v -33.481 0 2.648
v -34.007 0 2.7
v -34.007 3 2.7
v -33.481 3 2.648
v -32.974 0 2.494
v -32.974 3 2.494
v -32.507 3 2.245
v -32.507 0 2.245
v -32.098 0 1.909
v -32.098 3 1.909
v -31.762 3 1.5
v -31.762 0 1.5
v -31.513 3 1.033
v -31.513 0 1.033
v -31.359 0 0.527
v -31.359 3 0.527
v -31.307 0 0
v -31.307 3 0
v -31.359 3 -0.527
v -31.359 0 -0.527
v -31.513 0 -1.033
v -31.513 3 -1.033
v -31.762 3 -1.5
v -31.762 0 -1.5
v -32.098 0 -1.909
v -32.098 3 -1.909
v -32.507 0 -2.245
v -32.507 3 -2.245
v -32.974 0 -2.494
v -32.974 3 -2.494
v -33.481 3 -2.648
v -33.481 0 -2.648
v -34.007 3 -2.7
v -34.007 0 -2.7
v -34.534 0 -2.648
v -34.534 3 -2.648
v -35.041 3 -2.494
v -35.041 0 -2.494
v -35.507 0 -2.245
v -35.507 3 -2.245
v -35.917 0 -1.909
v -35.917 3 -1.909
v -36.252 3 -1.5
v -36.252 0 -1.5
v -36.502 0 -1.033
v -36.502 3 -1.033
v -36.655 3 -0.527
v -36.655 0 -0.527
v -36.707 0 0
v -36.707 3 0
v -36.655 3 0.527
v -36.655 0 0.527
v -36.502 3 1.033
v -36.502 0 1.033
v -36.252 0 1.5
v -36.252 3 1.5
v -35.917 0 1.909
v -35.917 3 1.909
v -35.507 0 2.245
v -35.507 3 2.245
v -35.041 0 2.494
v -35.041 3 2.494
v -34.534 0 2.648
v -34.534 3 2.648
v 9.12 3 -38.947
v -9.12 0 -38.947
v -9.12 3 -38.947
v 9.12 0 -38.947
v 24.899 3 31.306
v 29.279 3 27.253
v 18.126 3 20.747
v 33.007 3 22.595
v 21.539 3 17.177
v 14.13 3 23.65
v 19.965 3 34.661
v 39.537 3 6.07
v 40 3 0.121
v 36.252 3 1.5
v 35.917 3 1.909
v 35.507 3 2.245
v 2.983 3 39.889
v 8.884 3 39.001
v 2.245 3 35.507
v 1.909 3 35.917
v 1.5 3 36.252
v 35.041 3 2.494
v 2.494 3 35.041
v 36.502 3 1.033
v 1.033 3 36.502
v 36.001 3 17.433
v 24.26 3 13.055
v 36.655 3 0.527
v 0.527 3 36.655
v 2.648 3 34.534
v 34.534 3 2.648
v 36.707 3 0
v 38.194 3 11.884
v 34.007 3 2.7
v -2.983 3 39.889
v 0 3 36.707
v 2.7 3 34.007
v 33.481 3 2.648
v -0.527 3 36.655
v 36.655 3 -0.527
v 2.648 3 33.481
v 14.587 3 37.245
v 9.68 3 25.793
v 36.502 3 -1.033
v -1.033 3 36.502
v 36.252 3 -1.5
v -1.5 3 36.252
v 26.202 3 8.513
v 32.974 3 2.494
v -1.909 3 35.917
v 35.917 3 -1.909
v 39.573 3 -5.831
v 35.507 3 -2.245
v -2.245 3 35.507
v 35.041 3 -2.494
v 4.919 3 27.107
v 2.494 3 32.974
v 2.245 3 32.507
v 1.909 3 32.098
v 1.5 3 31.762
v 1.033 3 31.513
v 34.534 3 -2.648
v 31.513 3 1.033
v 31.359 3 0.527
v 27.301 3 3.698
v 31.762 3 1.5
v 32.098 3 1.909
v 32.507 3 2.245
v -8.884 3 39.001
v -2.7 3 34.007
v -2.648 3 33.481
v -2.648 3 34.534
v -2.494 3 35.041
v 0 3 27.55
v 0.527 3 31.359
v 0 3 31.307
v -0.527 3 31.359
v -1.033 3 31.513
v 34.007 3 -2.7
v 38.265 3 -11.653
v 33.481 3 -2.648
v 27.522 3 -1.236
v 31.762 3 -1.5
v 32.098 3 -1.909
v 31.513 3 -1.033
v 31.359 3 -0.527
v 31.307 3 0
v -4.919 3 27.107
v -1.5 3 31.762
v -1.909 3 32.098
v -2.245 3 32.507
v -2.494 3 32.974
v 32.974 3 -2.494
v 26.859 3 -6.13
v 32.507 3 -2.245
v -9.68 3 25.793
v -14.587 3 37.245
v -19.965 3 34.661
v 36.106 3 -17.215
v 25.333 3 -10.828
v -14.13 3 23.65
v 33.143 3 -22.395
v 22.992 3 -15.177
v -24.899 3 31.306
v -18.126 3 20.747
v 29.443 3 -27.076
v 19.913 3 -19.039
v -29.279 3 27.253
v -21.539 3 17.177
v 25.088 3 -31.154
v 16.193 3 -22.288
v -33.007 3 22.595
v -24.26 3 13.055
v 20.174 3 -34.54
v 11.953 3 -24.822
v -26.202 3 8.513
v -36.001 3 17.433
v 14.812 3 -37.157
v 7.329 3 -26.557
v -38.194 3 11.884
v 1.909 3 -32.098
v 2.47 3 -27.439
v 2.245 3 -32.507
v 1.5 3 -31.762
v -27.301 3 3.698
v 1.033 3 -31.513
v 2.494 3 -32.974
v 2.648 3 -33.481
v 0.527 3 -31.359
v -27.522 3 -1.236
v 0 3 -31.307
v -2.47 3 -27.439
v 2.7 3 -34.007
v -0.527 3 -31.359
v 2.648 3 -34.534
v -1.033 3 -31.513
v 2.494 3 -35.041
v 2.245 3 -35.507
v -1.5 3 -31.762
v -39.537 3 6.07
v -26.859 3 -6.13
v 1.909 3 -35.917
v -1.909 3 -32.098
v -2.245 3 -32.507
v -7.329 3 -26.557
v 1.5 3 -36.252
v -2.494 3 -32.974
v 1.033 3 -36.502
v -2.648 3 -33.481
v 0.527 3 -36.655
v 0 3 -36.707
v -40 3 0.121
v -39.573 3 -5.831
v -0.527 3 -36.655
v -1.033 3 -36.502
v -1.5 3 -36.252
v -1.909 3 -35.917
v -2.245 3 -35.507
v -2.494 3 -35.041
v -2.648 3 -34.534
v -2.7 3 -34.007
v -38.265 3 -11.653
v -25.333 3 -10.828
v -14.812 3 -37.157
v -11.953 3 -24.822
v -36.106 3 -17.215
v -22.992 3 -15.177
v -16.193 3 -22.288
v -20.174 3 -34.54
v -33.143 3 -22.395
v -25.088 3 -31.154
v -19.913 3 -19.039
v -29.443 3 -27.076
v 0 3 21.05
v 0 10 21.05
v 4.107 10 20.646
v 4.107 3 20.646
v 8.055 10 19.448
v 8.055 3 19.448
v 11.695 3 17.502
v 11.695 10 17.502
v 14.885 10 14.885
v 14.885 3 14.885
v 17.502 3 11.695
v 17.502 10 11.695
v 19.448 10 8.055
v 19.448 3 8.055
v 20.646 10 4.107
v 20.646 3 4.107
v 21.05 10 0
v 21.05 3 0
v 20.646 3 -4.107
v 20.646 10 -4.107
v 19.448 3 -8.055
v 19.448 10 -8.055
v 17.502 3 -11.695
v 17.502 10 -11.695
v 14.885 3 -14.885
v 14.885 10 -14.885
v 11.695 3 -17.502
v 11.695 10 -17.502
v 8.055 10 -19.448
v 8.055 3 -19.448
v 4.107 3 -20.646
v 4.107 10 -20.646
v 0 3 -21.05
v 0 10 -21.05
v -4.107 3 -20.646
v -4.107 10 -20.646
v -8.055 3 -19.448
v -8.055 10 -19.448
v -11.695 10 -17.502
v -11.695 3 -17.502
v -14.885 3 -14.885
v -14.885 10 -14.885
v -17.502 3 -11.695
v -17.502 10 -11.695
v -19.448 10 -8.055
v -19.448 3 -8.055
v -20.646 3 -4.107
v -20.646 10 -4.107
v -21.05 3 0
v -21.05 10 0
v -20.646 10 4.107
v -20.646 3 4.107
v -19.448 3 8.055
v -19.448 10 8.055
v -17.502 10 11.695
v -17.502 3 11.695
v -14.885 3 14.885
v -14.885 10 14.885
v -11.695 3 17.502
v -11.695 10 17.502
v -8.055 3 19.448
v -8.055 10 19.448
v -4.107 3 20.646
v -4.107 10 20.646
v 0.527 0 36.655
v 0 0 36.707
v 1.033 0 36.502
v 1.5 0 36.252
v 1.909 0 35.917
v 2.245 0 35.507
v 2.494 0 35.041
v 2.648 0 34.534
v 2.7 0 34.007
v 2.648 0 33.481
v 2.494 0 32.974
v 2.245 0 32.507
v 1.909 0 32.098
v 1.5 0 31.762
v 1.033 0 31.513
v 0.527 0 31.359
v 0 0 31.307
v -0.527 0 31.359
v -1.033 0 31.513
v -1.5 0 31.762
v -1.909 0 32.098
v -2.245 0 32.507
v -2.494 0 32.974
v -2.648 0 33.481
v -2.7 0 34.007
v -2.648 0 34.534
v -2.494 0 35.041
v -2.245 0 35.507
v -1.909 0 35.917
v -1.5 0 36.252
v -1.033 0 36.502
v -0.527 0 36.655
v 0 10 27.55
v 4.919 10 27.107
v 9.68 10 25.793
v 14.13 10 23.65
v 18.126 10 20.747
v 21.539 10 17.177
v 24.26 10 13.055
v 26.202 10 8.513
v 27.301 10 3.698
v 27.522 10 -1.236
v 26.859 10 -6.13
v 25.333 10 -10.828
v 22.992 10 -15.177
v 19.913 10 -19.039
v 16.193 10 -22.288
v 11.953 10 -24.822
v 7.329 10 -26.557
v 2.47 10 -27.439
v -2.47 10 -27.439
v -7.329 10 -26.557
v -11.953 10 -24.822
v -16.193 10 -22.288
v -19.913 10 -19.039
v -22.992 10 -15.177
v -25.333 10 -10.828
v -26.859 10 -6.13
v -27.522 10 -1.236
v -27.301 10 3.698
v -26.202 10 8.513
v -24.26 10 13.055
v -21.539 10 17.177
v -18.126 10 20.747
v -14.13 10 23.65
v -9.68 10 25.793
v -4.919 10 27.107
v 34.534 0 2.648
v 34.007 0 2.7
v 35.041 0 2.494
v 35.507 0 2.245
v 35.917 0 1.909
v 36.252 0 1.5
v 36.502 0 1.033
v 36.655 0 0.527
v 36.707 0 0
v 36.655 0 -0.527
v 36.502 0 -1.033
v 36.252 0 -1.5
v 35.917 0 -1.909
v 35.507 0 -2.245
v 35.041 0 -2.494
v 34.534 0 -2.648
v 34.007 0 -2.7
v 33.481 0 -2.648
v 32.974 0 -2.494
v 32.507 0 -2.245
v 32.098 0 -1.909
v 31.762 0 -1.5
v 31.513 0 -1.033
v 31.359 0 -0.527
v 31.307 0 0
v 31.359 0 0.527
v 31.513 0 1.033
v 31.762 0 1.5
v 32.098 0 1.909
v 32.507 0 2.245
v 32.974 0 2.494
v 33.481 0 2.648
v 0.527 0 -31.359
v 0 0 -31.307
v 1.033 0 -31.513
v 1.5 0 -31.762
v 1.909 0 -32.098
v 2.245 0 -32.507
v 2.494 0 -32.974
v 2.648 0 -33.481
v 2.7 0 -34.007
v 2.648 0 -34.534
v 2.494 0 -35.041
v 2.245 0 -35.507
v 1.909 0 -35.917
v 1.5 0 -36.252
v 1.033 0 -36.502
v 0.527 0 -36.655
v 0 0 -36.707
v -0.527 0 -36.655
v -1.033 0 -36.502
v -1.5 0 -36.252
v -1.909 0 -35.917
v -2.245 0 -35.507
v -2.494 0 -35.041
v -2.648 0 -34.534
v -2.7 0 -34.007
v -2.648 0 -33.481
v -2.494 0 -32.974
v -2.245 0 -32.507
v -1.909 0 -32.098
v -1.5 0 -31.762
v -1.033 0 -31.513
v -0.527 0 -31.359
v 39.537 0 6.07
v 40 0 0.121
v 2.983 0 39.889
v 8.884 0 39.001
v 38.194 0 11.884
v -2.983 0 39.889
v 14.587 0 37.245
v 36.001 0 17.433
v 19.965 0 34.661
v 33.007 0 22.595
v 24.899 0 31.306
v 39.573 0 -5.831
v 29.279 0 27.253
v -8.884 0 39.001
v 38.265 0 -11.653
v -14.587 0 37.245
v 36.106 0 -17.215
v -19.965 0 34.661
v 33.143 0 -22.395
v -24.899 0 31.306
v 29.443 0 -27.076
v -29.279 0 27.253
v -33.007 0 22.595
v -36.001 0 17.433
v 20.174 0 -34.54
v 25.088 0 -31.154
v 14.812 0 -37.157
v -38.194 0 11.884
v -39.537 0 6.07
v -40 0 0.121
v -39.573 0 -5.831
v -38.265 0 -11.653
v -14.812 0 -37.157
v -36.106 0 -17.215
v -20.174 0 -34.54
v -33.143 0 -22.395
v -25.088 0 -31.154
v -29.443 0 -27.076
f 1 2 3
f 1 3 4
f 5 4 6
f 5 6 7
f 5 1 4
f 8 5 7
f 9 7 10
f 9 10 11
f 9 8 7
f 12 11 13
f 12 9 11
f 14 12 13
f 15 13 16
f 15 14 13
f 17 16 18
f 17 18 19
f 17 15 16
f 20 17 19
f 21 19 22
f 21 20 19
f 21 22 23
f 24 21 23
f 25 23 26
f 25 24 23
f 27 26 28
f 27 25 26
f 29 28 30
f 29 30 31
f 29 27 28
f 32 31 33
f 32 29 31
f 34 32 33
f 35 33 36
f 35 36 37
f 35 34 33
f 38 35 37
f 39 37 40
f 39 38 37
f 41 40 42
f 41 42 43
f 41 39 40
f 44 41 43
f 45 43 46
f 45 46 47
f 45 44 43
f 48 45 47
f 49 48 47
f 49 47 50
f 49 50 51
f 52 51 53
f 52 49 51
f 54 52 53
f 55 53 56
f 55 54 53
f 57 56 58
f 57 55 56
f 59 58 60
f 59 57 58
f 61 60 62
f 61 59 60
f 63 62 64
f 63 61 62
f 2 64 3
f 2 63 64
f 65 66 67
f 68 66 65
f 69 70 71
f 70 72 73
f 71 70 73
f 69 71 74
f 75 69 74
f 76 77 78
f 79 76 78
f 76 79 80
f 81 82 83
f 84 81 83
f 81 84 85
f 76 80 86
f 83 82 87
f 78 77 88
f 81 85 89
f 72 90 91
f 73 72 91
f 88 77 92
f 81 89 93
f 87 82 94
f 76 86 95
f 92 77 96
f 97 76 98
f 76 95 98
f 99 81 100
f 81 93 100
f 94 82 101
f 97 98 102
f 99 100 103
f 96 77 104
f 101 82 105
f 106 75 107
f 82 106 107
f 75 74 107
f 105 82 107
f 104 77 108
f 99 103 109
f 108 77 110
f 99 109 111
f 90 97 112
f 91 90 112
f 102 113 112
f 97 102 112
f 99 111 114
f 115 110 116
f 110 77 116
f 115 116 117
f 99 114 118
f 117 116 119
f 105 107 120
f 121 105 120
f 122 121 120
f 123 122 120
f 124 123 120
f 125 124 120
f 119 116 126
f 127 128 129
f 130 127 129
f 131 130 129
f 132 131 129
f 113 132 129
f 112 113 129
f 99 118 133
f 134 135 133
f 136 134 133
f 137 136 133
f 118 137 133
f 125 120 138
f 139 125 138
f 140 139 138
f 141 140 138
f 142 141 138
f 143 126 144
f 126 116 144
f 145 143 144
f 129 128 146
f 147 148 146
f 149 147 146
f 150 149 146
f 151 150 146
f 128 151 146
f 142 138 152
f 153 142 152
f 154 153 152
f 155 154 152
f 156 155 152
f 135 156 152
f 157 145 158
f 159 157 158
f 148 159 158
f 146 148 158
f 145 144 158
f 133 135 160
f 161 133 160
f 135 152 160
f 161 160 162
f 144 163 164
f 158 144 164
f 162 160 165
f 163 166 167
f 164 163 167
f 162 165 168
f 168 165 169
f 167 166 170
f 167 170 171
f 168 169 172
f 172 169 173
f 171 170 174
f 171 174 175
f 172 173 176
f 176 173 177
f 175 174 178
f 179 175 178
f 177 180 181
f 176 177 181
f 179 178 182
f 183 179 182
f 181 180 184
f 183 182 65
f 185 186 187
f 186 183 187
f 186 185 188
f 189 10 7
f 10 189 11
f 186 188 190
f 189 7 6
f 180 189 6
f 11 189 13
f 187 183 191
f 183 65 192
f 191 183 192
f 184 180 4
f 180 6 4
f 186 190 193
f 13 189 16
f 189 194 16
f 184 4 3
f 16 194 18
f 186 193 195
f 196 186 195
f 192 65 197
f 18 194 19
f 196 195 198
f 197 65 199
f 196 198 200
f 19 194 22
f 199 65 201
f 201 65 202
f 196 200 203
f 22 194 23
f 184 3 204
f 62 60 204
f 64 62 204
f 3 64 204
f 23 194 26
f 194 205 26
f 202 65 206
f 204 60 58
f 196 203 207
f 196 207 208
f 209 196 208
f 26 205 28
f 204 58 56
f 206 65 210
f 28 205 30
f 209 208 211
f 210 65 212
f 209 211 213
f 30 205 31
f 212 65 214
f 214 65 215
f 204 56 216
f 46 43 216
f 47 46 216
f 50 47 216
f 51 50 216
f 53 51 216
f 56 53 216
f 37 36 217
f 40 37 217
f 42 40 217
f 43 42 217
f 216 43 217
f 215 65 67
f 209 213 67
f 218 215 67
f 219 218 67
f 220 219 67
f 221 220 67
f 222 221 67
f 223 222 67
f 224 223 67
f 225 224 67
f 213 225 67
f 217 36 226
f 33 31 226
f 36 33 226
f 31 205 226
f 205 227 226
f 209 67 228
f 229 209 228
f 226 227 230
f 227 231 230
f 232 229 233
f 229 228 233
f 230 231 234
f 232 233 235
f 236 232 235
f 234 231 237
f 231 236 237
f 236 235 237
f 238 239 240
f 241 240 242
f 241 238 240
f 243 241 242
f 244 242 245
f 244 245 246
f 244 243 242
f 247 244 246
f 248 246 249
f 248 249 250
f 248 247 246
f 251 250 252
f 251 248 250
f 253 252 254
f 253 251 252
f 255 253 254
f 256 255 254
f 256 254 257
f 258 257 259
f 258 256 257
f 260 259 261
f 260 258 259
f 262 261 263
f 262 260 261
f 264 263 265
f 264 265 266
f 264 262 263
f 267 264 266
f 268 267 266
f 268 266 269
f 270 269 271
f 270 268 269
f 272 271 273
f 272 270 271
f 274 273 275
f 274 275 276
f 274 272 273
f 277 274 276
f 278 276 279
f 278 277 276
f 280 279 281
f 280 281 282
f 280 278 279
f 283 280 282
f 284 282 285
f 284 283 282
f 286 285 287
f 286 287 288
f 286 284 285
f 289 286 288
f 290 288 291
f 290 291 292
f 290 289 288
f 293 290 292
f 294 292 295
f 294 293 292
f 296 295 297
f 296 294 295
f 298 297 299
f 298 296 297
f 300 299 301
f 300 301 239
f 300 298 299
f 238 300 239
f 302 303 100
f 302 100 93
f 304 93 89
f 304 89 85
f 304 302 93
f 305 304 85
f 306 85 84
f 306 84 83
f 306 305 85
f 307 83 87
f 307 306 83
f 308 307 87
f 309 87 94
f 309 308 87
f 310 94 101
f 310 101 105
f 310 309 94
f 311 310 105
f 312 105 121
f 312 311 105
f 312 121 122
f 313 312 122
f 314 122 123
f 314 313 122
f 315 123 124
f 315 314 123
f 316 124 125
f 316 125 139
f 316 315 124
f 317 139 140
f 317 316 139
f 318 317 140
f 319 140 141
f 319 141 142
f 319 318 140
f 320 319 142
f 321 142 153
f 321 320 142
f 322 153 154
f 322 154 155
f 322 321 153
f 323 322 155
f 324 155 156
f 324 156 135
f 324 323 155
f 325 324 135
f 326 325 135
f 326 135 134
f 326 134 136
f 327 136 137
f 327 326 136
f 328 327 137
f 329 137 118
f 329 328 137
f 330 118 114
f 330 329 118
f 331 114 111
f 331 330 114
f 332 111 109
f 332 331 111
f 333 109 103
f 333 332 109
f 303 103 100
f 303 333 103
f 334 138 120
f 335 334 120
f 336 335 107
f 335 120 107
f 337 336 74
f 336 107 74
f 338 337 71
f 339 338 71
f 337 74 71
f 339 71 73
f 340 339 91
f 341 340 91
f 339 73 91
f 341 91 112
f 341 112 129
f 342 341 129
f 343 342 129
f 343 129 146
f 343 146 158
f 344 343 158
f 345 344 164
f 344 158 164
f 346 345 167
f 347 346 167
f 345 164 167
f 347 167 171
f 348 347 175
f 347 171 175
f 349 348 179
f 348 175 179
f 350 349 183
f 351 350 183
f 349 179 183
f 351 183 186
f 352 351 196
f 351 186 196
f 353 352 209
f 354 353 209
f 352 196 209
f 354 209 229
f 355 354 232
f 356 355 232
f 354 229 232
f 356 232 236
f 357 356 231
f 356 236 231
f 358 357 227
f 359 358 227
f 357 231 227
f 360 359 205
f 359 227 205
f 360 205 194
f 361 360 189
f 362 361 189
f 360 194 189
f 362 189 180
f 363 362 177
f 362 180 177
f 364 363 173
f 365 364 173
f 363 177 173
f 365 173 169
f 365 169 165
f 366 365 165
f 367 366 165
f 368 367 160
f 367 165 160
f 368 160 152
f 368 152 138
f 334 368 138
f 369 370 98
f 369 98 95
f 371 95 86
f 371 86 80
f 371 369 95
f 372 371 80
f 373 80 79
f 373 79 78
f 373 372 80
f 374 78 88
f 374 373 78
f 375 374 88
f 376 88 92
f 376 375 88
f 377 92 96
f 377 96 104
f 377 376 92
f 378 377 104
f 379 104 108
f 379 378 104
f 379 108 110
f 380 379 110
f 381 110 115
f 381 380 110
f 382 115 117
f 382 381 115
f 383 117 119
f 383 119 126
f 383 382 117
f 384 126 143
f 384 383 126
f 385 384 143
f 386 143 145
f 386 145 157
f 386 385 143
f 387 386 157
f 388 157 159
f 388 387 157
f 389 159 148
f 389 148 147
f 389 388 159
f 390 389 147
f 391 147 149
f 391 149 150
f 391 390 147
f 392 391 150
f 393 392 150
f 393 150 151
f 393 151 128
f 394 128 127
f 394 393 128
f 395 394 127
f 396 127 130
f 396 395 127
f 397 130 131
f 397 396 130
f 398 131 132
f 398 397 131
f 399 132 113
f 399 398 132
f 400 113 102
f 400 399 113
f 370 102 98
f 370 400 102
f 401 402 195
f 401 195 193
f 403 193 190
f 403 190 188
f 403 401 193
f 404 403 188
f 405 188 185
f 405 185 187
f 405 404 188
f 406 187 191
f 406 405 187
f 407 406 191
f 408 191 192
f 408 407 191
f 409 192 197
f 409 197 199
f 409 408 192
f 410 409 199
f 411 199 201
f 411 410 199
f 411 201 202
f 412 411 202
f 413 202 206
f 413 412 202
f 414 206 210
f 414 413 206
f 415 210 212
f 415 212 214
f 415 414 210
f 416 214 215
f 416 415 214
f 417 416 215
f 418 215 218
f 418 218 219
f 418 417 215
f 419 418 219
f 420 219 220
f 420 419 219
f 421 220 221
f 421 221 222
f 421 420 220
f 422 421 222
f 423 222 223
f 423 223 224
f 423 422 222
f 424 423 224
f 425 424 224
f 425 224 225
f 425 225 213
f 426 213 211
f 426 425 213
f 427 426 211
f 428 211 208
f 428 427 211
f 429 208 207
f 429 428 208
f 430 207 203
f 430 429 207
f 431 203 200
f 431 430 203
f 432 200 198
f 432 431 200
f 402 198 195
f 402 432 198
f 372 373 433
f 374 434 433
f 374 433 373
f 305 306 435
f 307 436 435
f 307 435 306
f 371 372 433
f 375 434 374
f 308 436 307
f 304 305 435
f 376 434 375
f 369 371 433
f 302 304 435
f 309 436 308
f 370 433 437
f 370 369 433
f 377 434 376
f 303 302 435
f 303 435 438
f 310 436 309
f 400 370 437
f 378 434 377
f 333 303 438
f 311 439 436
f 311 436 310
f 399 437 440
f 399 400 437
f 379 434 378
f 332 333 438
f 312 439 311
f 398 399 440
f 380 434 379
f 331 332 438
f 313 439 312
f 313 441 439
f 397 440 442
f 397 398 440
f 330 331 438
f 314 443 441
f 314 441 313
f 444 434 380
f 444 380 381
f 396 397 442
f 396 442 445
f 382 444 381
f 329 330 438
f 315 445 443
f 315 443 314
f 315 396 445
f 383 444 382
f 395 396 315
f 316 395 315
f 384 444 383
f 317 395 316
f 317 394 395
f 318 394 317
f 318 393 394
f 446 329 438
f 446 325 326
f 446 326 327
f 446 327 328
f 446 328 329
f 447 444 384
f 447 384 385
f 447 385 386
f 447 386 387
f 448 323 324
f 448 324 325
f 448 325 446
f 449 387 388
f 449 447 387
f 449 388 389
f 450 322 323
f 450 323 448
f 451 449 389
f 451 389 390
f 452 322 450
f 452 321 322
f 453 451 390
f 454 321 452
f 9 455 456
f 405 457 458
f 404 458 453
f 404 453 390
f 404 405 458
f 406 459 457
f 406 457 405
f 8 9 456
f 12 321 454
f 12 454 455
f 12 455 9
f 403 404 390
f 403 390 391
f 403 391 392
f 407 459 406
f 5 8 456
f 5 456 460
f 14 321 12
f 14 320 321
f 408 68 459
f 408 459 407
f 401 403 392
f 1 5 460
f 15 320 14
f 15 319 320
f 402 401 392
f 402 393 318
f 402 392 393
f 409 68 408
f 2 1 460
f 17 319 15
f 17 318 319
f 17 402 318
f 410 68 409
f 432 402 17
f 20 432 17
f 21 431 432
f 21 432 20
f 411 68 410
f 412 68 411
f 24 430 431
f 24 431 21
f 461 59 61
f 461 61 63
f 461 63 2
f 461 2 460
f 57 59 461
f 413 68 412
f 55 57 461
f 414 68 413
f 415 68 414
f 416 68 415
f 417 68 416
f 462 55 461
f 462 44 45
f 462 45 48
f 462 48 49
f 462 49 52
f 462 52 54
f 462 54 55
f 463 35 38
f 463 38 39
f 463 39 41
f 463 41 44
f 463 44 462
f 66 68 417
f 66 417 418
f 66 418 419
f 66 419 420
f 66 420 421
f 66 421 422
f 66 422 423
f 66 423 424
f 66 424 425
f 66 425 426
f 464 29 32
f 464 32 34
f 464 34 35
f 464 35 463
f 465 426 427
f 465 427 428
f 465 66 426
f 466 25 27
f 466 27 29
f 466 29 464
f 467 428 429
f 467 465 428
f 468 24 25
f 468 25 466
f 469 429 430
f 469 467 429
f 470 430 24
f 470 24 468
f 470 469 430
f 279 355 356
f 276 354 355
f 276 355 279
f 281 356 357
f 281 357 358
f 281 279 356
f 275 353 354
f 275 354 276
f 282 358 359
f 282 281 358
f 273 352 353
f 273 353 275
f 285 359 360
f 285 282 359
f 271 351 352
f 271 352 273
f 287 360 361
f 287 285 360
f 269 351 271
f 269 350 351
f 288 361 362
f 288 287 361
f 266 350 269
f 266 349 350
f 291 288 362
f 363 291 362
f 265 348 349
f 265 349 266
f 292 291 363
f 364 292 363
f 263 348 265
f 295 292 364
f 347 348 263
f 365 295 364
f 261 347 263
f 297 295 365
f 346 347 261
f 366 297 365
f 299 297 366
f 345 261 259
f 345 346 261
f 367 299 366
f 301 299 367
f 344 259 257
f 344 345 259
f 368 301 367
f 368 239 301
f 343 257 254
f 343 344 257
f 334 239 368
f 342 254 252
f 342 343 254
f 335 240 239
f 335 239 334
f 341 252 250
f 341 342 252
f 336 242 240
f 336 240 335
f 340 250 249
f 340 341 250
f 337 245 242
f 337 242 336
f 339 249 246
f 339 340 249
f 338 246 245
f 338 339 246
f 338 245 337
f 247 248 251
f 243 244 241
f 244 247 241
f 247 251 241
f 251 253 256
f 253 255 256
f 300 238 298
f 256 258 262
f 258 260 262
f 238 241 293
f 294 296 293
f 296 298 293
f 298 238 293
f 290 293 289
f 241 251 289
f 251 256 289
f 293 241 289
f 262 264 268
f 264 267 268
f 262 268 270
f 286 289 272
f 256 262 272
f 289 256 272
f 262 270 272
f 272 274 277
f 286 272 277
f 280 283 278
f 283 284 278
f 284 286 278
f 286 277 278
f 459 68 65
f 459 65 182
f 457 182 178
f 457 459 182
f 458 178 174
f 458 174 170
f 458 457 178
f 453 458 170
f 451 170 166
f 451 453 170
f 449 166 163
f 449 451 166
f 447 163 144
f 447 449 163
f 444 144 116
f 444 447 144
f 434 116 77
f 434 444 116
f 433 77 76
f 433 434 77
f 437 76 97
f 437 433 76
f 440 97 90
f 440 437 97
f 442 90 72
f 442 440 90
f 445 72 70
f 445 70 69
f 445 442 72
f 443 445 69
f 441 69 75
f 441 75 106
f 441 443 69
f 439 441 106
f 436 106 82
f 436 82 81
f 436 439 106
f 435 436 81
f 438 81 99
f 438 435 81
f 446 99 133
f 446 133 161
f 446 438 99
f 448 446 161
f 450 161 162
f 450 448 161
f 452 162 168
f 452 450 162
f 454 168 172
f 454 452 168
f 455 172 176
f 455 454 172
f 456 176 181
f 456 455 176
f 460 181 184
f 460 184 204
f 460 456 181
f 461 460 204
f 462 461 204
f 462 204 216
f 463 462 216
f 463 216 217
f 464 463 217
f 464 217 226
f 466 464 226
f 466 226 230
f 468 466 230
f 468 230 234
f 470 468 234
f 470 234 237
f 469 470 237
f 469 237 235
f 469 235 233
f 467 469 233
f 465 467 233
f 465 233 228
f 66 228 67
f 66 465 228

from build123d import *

# Parameters (mm, degrees)
SKETCH1_R           = 2.7
BOSS_EXTRUDE1_DEPTH = 3
SKETCH2_R           = 27.55
SKETCH2_R_2         = 21.05
BOSS_EXTRUDE2_DEPTH = 7


with BuildPart() as part:
    # Sketch1 → Boss-Extrude1 (new body)
    with BuildSketch(Plane(origin=(0, 0, 0), x_dir=(1, 0, 0), z_dir=(0, 1, 0))):
        with BuildLine():
            Line((-9.11971668, 38.946511624), (9.11971668, 38.946511624))
            ThreePointArc((9.11971668, 38.946511624), (0, -40), (-9.11971668, 38.946511624))
        make_face()
        with Locations(Location((0, 34.007379053, 0), (0, 0, 270))):
            Circle(SKETCH1_R, mode=Mode.SUBTRACT)
        with Locations(Location((34.007379053, 0, 0), (0, 0, 270))):
            Circle(SKETCH1_R, mode=Mode.SUBTRACT)
        with Locations(Location((-34.007379053, 0, 0), (0, 0, 270))):
            Circle(SKETCH1_R, mode=Mode.SUBTRACT)
        with Locations(Location((0, -34.007379053, 0), (0, 0, 270))):
            Circle(SKETCH1_R, mode=Mode.SUBTRACT)
    extrude(amount=BOSS_EXTRUDE1_DEPTH)

    # Sketch2 → Boss-Extrude2 (add)
    with BuildSketch(Plane(origin=(0, 3, 0), x_dir=(1, 0, 0), z_dir=(0, 1, 0))):
        with Locations(Location((0, 0, 0), (0, 0, 270))):
            Circle(SKETCH2_R)
        with Locations(Location((0, 0, 0), (0, 0, 270))):
            Circle(SKETCH2_R_2, mode=Mode.SUBTRACT)
    extrude(amount=BOSS_EXTRUDE2_DEPTH)


solid = part.part
